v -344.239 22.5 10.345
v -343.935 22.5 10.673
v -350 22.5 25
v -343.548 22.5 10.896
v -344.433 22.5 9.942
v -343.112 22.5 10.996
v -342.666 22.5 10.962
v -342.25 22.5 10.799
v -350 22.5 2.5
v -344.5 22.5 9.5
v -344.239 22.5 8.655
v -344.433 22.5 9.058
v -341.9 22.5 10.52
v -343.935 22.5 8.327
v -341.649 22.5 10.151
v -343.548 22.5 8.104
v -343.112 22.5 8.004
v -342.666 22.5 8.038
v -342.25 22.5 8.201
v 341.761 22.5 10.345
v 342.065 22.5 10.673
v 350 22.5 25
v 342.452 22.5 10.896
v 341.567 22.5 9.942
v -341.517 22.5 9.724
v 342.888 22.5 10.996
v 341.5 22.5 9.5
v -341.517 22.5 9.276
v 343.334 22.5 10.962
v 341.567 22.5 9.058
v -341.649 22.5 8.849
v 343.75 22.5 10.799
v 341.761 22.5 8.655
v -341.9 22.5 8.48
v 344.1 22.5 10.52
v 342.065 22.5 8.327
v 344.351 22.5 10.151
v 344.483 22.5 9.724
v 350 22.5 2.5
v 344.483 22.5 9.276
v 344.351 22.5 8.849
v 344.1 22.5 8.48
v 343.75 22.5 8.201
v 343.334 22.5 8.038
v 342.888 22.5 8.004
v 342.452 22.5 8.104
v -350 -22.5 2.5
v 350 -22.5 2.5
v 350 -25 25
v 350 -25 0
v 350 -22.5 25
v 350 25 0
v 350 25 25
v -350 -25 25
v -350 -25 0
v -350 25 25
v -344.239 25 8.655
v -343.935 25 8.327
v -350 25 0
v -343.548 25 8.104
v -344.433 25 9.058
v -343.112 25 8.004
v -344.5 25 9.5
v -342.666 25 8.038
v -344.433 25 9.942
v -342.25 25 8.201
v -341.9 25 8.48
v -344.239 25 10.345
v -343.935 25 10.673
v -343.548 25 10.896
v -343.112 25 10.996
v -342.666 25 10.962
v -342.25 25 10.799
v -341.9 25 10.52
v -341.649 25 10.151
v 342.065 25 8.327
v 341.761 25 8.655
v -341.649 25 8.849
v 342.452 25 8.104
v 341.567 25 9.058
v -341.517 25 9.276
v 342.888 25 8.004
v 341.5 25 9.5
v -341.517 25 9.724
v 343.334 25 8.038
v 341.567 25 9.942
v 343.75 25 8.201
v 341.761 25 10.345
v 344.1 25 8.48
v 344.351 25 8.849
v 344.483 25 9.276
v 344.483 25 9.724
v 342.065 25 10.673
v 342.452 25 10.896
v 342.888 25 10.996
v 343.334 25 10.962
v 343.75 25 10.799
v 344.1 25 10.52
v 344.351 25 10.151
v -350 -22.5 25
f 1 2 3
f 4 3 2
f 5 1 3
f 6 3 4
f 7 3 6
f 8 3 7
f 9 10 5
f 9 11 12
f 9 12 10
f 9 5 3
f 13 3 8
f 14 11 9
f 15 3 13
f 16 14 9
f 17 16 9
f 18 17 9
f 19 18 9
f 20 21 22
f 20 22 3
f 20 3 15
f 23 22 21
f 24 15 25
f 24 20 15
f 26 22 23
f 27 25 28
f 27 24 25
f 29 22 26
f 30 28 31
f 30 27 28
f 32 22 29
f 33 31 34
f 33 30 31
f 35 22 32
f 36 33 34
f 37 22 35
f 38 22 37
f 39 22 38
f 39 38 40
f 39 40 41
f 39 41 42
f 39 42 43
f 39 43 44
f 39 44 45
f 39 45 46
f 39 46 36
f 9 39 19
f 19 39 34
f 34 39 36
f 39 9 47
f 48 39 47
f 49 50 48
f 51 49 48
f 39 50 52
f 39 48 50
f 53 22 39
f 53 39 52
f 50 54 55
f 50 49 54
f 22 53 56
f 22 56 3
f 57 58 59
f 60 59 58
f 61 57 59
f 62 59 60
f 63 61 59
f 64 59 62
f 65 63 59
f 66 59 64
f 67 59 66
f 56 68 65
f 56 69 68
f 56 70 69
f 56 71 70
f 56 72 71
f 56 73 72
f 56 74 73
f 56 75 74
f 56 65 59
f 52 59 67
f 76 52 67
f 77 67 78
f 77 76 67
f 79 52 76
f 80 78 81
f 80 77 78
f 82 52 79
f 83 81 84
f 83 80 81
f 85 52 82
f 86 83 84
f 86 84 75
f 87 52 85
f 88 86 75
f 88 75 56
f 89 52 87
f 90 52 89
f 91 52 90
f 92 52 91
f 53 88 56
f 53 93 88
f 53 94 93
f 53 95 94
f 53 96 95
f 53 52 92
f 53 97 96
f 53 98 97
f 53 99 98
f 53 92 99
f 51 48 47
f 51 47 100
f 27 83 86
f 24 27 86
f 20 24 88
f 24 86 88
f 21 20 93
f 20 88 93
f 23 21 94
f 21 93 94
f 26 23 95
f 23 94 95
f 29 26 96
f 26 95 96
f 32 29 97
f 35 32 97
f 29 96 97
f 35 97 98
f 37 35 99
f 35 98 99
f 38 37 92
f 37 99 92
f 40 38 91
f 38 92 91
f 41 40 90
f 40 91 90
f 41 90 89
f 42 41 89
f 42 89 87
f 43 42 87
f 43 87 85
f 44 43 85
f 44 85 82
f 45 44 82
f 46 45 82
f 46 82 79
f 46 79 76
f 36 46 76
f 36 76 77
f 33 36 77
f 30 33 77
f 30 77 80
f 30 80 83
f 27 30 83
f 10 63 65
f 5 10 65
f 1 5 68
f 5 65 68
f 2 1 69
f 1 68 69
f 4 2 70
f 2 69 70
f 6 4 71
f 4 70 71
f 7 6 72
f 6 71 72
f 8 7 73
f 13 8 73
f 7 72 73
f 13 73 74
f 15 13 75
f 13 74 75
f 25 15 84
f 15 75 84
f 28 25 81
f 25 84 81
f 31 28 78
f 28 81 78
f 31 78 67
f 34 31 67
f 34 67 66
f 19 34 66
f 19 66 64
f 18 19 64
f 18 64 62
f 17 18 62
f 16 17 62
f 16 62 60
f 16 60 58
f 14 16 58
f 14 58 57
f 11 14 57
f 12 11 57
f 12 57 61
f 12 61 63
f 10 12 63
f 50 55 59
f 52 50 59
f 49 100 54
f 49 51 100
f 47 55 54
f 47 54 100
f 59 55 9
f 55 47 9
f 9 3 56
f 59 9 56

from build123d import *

# Parameters (mm, degrees)
F1_DEPTH      = 350
F1_DEPTH_BACK = 350
F3_D          = 3
F3_DEPTH      = 10


with BuildPart() as f1:
    # F0 (on Right) → F1 (new body, two sides)
    with BuildSketch(Plane.YZ) as f1_sk:
        Polygon((-25, 0), (25, 0), (25, 25), (22.5, 25), (22.5, 2.5), (-22.5, 2.5), (-22.5, 25), (-25, 25), align=None)
    extrude(amount=F1_DEPTH)
    extrude(f1_sk.sketch, amount=-F1_DEPTH_BACK)

    # F3
    with Locations(Plane.XZ.offset(-22.5)):
        with Locations((-343, 9.5), (343, 9.5)):
            Hole(F3_D / 2, depth=F3_DEPTH)


solid = f1.part
